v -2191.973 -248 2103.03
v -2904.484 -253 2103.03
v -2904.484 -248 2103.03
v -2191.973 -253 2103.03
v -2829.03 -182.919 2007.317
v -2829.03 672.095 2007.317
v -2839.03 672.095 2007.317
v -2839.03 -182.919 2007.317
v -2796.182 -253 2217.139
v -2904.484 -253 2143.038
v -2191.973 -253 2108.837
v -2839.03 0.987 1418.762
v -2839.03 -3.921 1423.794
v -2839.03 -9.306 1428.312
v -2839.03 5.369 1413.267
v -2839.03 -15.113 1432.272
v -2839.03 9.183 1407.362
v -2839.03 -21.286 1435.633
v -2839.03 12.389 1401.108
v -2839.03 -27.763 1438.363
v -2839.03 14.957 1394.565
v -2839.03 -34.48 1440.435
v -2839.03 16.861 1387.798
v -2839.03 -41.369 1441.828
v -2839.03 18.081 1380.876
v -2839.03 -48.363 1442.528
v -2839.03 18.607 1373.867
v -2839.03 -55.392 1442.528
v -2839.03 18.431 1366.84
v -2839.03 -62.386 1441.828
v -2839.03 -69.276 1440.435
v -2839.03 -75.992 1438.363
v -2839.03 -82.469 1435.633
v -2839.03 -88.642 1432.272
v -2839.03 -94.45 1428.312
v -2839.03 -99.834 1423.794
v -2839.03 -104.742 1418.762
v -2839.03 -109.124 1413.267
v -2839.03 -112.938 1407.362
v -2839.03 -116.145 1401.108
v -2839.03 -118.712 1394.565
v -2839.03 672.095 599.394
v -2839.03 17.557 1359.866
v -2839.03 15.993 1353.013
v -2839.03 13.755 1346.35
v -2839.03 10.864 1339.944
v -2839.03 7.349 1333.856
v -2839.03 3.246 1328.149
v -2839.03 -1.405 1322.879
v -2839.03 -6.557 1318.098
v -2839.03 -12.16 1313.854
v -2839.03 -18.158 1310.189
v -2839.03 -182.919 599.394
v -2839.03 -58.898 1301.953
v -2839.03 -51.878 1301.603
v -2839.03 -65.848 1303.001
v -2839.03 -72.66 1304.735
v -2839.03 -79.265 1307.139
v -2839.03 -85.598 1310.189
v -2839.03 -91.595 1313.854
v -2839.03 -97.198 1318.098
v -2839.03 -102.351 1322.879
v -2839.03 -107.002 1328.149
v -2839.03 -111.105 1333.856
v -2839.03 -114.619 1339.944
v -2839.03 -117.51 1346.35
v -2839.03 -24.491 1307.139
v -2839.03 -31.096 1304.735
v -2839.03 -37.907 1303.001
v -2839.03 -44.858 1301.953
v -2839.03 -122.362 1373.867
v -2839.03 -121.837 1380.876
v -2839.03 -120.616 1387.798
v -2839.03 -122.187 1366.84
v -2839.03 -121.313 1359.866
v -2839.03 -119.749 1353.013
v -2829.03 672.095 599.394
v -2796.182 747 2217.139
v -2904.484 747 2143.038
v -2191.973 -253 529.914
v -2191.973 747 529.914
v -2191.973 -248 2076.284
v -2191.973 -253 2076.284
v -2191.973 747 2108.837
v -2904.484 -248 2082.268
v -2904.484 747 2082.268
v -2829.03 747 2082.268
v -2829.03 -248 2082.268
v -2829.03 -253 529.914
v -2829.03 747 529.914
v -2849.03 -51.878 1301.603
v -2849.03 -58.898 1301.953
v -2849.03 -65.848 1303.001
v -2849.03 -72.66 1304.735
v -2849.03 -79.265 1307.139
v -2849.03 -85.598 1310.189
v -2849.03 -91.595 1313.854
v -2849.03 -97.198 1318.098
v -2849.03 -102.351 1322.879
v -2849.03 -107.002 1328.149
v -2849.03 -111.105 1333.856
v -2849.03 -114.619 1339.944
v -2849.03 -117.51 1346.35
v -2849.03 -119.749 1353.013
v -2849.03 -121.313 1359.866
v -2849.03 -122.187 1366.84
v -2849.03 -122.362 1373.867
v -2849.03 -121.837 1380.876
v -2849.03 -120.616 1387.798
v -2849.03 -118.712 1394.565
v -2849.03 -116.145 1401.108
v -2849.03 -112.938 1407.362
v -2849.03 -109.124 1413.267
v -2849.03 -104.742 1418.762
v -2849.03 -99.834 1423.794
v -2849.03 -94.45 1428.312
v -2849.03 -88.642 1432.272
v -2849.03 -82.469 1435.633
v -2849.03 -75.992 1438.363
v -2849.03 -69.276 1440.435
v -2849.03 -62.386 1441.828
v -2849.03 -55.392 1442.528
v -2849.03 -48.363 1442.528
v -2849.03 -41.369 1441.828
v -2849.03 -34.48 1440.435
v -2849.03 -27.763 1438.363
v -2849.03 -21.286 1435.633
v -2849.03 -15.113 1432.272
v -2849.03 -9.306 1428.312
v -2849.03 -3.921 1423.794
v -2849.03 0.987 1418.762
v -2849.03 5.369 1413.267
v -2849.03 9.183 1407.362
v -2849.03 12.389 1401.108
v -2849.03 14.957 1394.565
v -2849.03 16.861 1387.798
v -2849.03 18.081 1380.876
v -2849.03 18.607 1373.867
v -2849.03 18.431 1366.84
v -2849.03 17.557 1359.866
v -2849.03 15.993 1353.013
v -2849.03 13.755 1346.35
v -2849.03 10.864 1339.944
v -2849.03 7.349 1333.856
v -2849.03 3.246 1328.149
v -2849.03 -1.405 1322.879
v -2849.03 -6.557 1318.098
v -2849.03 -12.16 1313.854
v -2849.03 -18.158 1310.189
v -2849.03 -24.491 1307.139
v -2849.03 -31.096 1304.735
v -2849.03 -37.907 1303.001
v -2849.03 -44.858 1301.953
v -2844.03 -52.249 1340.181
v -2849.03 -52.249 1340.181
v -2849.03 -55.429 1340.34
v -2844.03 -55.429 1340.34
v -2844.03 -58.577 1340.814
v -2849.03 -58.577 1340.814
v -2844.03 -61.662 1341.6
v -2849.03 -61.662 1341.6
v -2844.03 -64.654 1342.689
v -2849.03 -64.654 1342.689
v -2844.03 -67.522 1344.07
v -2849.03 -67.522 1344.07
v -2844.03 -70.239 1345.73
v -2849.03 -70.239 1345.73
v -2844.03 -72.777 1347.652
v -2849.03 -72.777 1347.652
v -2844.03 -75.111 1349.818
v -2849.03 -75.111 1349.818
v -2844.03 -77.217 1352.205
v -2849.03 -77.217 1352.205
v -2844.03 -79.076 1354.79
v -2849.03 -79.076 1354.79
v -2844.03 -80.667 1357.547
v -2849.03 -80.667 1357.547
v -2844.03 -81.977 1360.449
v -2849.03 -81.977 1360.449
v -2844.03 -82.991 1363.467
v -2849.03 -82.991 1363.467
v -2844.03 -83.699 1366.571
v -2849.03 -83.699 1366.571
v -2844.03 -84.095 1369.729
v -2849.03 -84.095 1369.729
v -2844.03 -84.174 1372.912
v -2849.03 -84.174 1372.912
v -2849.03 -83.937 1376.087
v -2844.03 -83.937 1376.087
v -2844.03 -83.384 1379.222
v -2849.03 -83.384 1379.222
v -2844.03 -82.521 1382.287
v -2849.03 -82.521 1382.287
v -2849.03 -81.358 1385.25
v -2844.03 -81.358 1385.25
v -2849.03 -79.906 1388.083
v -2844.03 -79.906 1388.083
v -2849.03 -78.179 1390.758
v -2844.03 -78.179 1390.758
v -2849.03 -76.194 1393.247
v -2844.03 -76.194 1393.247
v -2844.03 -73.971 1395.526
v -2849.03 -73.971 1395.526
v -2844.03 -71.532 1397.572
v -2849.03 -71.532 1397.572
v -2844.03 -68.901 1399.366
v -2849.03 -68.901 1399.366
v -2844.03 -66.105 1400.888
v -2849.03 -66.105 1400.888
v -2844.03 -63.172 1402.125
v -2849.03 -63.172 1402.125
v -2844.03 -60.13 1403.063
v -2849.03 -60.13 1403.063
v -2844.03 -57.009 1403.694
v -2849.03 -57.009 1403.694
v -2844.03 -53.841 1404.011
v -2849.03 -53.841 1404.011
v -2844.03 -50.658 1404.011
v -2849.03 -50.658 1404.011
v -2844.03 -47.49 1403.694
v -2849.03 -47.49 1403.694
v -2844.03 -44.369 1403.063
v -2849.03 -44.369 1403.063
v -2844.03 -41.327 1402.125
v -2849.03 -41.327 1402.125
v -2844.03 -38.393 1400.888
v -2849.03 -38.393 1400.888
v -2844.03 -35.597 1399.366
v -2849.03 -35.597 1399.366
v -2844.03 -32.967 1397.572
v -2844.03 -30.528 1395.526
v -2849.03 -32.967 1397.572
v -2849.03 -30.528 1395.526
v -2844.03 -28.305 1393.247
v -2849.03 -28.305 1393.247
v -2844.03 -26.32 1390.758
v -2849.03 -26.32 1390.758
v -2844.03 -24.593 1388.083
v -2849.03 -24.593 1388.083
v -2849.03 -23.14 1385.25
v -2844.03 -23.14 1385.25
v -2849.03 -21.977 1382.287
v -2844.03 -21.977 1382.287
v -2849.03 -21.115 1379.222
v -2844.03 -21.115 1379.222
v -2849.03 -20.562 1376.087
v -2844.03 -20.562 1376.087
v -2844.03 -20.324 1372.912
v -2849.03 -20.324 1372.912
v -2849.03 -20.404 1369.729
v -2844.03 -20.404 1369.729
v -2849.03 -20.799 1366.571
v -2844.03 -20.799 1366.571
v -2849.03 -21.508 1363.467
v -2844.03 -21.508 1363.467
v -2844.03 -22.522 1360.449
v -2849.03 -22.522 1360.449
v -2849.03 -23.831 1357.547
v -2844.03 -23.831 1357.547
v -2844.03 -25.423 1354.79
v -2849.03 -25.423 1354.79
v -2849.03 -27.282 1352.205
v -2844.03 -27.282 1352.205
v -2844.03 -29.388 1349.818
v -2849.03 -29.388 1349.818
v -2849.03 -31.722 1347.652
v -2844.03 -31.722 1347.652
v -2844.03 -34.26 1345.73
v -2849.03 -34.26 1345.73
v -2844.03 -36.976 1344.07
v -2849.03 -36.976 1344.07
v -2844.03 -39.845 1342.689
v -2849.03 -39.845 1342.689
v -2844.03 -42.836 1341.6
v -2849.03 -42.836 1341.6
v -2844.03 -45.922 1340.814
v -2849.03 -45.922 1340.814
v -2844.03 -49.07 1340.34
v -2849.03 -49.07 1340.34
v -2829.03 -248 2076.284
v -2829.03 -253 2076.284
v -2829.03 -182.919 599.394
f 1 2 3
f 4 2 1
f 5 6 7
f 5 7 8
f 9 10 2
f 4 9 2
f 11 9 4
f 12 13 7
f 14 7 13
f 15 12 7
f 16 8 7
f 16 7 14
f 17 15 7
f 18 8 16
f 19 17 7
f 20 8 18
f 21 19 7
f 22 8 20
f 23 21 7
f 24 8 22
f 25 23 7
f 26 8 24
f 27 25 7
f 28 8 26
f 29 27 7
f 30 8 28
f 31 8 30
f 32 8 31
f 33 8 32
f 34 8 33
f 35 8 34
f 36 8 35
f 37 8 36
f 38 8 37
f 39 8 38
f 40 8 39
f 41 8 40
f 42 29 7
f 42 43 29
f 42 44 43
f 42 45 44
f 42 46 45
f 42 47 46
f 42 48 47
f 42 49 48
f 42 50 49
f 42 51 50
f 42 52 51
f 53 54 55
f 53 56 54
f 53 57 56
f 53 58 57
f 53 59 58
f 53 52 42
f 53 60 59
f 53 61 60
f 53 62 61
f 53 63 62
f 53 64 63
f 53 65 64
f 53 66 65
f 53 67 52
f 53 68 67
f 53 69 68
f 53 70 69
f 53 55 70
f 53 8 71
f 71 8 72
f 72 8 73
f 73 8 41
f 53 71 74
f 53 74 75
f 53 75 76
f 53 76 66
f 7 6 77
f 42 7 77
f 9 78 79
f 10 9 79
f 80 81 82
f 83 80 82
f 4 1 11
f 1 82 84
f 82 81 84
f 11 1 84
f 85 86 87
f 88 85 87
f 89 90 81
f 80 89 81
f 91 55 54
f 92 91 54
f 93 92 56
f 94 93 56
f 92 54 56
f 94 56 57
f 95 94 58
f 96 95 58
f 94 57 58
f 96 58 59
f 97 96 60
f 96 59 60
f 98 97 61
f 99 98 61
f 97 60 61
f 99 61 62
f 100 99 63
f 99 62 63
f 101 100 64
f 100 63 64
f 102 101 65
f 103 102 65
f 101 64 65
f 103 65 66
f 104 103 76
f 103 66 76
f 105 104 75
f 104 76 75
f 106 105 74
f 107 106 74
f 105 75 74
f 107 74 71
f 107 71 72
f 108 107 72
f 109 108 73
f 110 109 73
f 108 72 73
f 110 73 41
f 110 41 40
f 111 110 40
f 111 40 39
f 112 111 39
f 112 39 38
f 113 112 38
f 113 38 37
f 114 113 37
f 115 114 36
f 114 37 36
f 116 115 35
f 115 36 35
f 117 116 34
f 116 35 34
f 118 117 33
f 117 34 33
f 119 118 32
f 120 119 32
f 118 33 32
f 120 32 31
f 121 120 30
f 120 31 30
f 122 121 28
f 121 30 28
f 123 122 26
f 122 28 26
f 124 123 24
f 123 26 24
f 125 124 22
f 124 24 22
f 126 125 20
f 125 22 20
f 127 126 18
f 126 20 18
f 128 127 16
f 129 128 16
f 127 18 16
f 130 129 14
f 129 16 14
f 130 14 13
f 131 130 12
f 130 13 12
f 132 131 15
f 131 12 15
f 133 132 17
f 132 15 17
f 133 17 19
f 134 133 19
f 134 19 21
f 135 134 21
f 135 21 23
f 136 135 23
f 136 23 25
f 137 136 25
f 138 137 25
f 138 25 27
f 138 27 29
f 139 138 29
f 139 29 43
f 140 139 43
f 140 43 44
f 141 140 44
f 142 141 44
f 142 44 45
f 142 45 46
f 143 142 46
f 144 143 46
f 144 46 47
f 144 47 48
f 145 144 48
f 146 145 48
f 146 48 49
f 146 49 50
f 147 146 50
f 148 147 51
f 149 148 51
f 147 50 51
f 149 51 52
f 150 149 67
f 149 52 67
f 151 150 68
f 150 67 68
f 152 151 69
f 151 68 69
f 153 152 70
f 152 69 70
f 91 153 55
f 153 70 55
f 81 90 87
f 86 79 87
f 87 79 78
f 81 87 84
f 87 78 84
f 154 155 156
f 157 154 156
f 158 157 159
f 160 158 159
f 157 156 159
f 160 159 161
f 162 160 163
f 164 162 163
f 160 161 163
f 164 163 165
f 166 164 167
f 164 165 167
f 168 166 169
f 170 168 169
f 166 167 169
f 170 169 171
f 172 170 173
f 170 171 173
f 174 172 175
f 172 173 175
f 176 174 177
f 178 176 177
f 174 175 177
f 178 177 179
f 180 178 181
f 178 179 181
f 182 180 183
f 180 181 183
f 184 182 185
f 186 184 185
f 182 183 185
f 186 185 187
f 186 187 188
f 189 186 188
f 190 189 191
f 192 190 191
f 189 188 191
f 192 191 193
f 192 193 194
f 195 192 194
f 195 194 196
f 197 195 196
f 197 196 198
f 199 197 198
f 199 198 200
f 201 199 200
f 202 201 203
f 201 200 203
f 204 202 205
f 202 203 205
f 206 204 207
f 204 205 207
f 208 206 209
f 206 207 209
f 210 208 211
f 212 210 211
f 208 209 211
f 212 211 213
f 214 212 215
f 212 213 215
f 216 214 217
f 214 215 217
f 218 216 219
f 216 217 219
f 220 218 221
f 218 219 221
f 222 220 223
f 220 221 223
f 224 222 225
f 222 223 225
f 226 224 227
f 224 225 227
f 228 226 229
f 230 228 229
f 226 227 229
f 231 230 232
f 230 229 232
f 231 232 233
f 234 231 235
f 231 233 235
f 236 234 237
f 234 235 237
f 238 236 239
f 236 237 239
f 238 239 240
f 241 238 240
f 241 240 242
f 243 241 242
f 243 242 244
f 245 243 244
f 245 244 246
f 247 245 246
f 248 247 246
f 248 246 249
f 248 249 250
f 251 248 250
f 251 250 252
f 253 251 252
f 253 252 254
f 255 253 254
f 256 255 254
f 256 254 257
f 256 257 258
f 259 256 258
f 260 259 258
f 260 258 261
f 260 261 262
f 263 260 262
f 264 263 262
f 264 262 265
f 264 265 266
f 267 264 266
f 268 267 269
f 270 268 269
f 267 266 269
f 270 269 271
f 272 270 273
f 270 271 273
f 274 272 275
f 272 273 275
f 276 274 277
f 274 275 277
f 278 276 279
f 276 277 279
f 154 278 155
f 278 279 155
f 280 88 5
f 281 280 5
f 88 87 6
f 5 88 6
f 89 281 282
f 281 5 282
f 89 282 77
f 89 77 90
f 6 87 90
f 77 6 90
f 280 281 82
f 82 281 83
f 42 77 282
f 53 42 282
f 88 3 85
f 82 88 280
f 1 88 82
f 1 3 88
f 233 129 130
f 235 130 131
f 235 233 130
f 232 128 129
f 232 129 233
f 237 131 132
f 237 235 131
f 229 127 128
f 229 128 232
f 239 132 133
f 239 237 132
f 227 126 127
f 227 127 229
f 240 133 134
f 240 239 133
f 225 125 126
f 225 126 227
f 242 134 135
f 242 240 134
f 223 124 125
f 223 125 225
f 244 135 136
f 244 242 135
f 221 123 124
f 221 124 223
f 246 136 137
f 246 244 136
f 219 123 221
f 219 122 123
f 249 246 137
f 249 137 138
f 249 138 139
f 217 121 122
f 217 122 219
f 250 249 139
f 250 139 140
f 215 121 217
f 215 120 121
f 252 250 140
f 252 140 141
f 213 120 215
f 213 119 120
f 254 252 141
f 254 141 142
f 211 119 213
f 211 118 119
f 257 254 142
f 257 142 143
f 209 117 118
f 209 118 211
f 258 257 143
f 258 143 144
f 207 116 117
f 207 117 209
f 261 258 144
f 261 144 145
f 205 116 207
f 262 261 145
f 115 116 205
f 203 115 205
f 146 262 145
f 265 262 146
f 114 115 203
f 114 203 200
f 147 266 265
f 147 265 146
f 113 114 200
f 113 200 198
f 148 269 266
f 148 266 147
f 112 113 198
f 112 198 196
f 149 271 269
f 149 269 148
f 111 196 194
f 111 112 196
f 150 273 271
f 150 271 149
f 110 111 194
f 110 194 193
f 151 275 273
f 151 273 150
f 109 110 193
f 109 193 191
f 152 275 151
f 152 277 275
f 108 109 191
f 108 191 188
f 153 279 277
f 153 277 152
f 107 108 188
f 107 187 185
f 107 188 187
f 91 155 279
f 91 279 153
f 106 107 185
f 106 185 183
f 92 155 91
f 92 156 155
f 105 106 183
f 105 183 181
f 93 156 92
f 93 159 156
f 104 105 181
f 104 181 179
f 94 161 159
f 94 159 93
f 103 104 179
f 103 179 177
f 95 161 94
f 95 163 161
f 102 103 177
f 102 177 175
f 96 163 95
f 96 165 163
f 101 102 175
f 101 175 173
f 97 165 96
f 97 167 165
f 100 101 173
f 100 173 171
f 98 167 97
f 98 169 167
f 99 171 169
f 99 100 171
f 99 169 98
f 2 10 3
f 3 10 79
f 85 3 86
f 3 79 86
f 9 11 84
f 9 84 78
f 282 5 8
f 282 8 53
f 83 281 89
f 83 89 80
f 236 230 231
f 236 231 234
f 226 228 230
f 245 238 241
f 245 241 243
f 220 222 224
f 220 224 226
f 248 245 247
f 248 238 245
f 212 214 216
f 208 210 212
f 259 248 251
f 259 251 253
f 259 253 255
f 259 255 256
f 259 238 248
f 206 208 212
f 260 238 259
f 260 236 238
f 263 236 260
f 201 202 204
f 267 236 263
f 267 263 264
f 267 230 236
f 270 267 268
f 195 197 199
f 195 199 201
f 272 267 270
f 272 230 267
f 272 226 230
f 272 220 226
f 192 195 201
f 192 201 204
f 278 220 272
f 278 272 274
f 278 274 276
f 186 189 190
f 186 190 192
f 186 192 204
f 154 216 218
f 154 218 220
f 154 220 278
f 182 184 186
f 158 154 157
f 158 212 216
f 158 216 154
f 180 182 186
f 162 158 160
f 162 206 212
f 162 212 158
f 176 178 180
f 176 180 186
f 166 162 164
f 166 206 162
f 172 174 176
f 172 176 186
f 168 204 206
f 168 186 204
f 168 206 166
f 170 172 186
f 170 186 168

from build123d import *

# Parameters (mm, degrees)
PAD022_DEPTH    = 1000
SKETCH031_W     = 855.878418
SKETCH031_H     = 26.746094
POCKET007_DEPTH = 5
SKETCH033_W     = 1407.922851
SKETCH033_H     = 855.013962
PAD024_DEPTH    = 10
SKETCH034_R     = 70.506238
PAD025_DEPTH    = 10
SKETCH035_R     = 31.935014
POCKET008_DEPTH = 5


with BuildPart() as part:
    # Sketch029 → Pad022 (new body)
    with BuildSketch(Plane.XZ):
        Polygon((-2829.030029, 2082.267822), (-2829.030029, 529.913818), (-2191.9729, 529.913818), (-2191.9729, 2108.837402), (-2796.181885, 2217.138916), (-2904.483643, 2143.037842), (-2904.483643, 2082.267822), align=None)
    extrude(amount=PAD022_DEPTH)

    # Sketch031 (on Face9 of Pad022) → Pocket007 (cut)
    with BuildSketch(Plane.XZ.offset(1000)):
        with Locations((-2559.213379, 2089.656738)):
            Rectangle(SKETCH031_W, SKETCH031_H)
    extrude(amount=-POCKET007_DEPTH, mode=Mode.SUBTRACT)

    # Sketch033 (on Face1 of Pocket007) → Pad024 (join)
    with BuildSketch(Plane(origin=(-2829.030029, 0, 0), x_dir=(0, 0, -1), z_dir=(-1, 0, 0))):
        with Locations((-1303.355225, 502.411583)):
            Rectangle(SKETCH033_W, SKETCH033_H)
    extrude(amount=PAD024_DEPTH)

    # Sketch034 (on Face17 of Pad024) → Pad025 (join)
    with BuildSketch(Plane(origin=(-2839.030029, 0, 0), x_dir=(0, 0, -1), z_dir=(-1, 0, 0))):
        with Locations((-1372.109253, 798.877693)):
            Circle(SKETCH034_R)
    extrude(amount=PAD025_DEPTH)

    # Sketch035 (on Face20 of Pad025) → Pocket008 (cut)
    with BuildSketch(Plane(origin=(-2849.030029, 0, 0), x_dir=(0, 0, -1), z_dir=(-1, 0, 0))):
        with Locations((-1372.115967, 799.249336)):
            Circle(SKETCH035_R)
    extrude(amount=-POCKET008_DEPTH, mode=Mode.SUBTRACT)


with BuildPart() as part_1:
    # Body018 placement: moved
    add(part.part.moved(Location((0, 747, 0))))


solid = part_1.part
